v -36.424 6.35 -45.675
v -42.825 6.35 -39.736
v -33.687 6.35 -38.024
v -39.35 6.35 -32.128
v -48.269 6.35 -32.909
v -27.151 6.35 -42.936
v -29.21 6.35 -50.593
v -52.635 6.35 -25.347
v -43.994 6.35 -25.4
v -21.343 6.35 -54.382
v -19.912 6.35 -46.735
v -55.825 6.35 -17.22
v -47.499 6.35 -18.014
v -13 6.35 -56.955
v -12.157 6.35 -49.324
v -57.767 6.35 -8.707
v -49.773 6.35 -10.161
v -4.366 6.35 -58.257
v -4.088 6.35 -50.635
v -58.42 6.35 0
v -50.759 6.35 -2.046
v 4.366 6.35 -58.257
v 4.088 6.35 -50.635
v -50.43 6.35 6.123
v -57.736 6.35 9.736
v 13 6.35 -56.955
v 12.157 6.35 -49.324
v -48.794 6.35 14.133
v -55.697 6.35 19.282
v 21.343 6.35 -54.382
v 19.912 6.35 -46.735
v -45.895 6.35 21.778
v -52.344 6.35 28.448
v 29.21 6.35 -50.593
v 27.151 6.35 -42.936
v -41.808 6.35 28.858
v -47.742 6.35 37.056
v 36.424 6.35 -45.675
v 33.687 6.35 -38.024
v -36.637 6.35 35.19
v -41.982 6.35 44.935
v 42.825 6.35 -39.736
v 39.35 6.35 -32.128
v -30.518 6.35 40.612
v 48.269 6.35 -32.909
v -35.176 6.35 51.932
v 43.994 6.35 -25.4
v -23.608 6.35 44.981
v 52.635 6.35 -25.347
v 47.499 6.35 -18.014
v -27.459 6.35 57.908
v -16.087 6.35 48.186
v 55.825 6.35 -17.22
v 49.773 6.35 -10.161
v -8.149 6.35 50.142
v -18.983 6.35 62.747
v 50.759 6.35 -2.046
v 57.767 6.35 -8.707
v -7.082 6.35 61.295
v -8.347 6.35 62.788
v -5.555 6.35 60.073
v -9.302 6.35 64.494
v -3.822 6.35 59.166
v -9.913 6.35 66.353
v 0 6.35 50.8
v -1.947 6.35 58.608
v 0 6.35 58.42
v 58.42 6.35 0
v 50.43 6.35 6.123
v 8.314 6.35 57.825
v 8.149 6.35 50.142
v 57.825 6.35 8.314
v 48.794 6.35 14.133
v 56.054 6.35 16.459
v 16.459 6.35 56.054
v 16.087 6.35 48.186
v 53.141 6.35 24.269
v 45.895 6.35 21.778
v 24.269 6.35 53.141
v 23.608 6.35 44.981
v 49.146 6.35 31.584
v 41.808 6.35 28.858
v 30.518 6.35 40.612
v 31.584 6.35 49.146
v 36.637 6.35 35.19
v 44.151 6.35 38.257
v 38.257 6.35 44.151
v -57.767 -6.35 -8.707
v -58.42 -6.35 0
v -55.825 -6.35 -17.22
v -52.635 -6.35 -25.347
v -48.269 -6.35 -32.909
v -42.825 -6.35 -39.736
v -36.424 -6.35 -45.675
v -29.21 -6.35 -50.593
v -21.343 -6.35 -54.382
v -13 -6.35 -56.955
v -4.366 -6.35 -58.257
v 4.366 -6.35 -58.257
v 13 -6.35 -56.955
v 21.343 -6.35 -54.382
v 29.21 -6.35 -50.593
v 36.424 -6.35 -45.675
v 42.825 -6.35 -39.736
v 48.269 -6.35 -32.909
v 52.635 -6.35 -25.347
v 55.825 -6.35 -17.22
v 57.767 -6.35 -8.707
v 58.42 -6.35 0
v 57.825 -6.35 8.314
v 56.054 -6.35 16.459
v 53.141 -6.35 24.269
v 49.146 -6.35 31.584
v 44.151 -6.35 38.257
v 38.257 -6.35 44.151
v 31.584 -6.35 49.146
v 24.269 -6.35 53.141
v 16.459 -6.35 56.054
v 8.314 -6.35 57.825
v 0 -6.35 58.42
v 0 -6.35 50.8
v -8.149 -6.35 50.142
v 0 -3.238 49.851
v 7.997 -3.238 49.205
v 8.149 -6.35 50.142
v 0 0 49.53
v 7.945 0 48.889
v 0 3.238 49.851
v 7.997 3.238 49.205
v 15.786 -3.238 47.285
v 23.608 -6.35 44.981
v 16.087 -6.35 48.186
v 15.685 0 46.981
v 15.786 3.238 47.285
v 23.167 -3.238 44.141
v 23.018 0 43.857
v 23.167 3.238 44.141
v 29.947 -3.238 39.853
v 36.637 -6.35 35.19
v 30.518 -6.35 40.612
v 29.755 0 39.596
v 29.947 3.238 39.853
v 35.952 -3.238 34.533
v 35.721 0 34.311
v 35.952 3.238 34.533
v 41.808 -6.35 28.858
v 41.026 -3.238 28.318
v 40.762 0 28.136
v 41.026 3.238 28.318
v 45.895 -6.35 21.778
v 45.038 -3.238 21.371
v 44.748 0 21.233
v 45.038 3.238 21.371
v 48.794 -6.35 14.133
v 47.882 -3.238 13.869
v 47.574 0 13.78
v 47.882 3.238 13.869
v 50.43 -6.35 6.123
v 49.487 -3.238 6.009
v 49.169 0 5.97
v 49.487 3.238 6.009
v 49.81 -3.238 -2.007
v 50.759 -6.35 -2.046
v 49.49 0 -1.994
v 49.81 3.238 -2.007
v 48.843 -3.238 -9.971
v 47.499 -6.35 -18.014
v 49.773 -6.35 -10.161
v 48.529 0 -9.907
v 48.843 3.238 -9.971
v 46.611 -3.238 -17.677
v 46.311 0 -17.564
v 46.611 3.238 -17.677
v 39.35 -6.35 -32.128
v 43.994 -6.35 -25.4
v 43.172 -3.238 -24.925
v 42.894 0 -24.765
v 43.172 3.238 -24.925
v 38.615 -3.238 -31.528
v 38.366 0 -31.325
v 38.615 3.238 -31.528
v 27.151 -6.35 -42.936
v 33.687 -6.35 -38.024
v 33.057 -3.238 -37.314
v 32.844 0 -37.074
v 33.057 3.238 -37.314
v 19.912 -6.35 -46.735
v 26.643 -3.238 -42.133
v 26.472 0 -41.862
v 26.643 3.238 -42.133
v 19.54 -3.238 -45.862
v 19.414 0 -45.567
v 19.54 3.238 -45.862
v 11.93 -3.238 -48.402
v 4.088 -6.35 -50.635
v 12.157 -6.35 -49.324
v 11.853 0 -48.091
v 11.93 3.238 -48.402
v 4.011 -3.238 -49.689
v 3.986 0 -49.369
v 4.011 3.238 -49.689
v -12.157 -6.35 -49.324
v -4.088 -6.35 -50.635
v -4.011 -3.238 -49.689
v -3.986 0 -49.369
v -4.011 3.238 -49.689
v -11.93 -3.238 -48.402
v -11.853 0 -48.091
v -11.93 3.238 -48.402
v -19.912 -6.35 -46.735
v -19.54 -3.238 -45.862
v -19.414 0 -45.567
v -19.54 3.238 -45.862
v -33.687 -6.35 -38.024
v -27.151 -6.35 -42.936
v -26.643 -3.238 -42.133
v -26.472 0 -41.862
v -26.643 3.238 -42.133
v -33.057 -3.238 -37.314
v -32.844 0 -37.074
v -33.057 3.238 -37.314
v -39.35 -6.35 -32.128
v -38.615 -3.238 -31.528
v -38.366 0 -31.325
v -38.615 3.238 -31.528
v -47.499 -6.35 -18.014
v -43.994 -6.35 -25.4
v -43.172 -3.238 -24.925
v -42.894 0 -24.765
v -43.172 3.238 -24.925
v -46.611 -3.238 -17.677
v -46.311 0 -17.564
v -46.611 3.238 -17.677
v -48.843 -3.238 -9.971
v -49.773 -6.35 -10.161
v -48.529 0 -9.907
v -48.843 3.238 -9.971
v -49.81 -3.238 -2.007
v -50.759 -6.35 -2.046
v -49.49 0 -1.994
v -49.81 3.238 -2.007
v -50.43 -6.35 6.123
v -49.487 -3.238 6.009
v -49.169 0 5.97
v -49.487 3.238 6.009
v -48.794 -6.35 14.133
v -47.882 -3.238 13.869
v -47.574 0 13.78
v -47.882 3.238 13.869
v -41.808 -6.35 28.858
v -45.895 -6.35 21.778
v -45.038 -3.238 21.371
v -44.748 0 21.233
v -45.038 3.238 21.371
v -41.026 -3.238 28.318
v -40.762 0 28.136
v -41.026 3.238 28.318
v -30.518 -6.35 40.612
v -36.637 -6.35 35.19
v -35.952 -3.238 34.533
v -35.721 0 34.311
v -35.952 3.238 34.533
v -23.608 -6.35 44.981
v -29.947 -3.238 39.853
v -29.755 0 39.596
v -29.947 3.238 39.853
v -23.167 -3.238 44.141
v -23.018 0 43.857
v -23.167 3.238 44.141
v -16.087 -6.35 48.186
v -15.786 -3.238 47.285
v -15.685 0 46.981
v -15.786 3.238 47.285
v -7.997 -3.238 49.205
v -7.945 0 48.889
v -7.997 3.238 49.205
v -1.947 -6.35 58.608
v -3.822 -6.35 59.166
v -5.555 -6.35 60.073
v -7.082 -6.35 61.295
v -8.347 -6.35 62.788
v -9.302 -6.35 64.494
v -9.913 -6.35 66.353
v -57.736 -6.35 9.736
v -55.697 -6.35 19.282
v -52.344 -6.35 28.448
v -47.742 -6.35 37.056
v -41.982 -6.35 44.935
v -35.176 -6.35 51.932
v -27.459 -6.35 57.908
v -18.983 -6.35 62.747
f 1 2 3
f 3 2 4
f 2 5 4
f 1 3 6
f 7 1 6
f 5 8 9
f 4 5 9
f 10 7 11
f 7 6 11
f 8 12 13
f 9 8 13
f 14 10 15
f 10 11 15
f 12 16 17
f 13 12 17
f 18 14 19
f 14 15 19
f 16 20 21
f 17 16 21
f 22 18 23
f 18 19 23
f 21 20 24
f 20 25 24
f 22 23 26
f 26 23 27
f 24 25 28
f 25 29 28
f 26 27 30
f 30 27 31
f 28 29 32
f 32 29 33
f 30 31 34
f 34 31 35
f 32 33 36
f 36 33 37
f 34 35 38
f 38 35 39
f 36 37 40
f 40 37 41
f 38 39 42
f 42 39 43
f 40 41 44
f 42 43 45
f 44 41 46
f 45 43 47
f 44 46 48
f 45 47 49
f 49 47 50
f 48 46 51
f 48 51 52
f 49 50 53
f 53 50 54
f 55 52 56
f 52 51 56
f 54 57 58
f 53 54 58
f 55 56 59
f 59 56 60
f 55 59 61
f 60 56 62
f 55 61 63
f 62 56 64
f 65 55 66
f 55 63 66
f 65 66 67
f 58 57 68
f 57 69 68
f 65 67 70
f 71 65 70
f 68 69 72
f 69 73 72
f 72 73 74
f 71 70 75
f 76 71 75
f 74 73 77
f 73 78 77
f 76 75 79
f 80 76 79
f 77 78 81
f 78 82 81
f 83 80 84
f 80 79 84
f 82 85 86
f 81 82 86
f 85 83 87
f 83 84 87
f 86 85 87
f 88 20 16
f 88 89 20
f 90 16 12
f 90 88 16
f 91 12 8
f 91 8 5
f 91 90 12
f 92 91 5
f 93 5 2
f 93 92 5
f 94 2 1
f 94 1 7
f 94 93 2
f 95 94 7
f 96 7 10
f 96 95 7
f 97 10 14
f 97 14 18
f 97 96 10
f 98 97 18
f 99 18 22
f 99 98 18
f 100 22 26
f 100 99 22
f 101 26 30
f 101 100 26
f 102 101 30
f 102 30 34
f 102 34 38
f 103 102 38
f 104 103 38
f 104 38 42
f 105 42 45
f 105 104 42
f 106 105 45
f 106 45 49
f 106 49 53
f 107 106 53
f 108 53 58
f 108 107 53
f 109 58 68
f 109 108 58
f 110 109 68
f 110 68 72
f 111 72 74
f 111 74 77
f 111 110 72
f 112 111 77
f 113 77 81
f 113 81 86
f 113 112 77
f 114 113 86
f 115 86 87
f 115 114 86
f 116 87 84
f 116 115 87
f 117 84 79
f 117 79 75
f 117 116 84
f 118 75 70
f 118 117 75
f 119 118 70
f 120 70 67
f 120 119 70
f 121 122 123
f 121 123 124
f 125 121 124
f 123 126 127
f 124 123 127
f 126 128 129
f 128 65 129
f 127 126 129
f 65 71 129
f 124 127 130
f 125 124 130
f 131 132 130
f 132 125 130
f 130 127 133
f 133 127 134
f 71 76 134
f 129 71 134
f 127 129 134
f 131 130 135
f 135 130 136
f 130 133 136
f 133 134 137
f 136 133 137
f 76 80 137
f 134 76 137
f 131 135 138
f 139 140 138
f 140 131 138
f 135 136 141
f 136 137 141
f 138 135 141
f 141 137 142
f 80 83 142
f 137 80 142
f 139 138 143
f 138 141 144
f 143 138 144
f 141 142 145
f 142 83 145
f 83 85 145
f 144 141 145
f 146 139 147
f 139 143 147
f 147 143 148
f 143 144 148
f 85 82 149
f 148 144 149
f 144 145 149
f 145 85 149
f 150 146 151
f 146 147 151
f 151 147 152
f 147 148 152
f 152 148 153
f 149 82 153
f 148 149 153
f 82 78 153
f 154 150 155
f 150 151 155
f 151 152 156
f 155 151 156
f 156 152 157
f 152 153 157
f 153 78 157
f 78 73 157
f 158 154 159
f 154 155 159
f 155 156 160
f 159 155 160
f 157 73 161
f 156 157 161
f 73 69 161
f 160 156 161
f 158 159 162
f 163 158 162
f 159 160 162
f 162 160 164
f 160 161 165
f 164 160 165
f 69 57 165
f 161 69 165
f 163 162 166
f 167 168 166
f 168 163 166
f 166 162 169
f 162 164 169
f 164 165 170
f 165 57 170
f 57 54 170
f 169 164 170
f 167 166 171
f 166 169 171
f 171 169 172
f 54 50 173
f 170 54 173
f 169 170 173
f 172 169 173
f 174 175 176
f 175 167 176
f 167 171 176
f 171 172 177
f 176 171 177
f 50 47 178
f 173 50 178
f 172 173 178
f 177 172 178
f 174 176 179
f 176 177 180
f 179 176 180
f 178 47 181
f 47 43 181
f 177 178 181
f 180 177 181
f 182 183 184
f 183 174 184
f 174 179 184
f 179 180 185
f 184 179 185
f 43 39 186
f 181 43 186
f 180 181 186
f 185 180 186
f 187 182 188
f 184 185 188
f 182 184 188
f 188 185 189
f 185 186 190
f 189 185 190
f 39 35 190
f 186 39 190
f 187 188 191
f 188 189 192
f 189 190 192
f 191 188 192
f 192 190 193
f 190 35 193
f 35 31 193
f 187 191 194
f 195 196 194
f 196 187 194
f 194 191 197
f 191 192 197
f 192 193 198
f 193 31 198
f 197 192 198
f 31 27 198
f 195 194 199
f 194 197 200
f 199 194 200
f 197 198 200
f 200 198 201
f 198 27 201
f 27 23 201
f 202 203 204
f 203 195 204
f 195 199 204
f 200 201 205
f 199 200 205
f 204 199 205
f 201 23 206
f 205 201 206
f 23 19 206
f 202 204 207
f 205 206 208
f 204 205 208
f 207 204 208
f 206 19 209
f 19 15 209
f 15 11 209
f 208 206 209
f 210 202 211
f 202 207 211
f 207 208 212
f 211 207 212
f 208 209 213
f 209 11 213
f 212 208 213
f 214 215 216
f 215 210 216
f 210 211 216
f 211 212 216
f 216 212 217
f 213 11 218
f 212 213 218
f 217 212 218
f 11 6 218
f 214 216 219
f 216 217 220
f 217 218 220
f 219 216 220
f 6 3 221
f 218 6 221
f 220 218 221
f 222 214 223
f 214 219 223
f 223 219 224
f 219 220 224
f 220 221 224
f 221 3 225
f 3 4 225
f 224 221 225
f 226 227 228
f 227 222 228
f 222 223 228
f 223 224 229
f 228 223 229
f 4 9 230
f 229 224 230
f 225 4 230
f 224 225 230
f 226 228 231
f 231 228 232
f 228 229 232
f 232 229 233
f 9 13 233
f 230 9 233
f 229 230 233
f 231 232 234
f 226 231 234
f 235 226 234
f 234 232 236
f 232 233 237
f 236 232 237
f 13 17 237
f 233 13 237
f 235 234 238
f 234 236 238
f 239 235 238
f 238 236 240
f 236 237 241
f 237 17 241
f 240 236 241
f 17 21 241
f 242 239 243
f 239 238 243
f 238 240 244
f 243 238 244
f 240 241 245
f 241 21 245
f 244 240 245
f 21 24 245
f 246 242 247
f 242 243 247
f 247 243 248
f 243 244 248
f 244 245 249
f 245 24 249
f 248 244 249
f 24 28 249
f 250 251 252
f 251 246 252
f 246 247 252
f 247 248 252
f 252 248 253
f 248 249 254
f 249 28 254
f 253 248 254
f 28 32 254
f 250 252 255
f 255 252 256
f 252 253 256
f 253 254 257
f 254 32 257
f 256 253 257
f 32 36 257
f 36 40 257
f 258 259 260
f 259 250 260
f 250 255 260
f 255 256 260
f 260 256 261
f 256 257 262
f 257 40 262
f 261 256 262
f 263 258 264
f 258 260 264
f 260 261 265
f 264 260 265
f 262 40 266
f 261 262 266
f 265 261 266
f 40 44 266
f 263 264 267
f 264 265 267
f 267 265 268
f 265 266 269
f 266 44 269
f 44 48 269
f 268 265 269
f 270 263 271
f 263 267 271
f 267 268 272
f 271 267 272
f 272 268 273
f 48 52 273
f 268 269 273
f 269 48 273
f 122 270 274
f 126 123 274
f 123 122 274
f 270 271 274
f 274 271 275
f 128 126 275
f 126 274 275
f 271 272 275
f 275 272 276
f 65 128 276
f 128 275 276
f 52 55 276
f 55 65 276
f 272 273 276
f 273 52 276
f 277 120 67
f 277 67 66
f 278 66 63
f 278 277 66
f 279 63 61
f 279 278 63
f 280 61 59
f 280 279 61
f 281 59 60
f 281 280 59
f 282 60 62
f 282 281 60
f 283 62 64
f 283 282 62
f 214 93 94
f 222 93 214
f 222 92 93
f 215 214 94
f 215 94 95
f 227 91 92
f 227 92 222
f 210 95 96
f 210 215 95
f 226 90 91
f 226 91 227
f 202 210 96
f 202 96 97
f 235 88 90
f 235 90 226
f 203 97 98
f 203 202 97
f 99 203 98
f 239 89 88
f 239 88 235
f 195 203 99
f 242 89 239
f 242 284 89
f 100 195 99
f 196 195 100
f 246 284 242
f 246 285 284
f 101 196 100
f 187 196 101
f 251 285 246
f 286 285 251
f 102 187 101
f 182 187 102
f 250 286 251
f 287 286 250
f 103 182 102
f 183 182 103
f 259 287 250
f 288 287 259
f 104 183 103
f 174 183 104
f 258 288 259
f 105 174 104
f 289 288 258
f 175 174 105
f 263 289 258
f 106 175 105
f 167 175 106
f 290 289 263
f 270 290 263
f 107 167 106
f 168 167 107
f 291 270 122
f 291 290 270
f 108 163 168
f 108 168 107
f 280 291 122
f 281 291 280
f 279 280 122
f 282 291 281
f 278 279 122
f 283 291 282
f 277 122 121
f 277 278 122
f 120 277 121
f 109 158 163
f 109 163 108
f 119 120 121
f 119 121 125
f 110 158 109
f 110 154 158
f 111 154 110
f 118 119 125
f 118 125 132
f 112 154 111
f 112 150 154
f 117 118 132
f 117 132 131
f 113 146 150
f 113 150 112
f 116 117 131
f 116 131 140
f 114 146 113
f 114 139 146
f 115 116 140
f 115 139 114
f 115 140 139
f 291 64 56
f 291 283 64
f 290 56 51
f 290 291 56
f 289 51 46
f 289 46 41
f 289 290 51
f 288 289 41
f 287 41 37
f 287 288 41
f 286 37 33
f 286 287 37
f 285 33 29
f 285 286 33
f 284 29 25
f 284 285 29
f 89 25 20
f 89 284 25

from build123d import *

# Parameters (mm, degrees)
F0_R     = 50.8
F1_DEPTH = 6.35


with BuildPart() as f1:
    # F0 (on Front) → F1 (new body, symmetric)
    with BuildSketch(Plane.XZ):
        with BuildLine():
            ThreePointArc((-58.42, 0), (0, -58.42), (58.42, 0))
            ThreePointArc((58.42, 0), (41.309178, 41.309178), (0, 58.42))
            ThreePointArc((0, 58.42), (-41.309178, 41.309178), (-58.42, 0))
        make_face()
        Circle(F0_R, mode=Mode.SUBTRACT)
        with BuildLine():
            ThreePointArc((-58.42, 0), (-41.309178, 41.309178), (0, 58.42))
            ThreePointArc((0, 58.42), (-6.348121, 60.647349), (-9.91288, 66.352804))
            ThreePointArc((-9.91288, 66.352804), (-45.000104, 41.096336), (-58.42, 0))
        make_face()
    extrude(amount=F1_DEPTH, both=True)

    # F2 (on Right) → F3 (revolve)
    with BuildSketch(Plane.YZ):
        with BuildLine():
            Line((6.35, 50.8), (-6.35, 50.8))
            ThreePointArc((-6.35, 50.8), (0, 49.53), (6.35, 50.8))
        make_face()
    revolve(axis=Axis((0, 1.744404, 0), (0, 1, 0)))


solid = f1.part
